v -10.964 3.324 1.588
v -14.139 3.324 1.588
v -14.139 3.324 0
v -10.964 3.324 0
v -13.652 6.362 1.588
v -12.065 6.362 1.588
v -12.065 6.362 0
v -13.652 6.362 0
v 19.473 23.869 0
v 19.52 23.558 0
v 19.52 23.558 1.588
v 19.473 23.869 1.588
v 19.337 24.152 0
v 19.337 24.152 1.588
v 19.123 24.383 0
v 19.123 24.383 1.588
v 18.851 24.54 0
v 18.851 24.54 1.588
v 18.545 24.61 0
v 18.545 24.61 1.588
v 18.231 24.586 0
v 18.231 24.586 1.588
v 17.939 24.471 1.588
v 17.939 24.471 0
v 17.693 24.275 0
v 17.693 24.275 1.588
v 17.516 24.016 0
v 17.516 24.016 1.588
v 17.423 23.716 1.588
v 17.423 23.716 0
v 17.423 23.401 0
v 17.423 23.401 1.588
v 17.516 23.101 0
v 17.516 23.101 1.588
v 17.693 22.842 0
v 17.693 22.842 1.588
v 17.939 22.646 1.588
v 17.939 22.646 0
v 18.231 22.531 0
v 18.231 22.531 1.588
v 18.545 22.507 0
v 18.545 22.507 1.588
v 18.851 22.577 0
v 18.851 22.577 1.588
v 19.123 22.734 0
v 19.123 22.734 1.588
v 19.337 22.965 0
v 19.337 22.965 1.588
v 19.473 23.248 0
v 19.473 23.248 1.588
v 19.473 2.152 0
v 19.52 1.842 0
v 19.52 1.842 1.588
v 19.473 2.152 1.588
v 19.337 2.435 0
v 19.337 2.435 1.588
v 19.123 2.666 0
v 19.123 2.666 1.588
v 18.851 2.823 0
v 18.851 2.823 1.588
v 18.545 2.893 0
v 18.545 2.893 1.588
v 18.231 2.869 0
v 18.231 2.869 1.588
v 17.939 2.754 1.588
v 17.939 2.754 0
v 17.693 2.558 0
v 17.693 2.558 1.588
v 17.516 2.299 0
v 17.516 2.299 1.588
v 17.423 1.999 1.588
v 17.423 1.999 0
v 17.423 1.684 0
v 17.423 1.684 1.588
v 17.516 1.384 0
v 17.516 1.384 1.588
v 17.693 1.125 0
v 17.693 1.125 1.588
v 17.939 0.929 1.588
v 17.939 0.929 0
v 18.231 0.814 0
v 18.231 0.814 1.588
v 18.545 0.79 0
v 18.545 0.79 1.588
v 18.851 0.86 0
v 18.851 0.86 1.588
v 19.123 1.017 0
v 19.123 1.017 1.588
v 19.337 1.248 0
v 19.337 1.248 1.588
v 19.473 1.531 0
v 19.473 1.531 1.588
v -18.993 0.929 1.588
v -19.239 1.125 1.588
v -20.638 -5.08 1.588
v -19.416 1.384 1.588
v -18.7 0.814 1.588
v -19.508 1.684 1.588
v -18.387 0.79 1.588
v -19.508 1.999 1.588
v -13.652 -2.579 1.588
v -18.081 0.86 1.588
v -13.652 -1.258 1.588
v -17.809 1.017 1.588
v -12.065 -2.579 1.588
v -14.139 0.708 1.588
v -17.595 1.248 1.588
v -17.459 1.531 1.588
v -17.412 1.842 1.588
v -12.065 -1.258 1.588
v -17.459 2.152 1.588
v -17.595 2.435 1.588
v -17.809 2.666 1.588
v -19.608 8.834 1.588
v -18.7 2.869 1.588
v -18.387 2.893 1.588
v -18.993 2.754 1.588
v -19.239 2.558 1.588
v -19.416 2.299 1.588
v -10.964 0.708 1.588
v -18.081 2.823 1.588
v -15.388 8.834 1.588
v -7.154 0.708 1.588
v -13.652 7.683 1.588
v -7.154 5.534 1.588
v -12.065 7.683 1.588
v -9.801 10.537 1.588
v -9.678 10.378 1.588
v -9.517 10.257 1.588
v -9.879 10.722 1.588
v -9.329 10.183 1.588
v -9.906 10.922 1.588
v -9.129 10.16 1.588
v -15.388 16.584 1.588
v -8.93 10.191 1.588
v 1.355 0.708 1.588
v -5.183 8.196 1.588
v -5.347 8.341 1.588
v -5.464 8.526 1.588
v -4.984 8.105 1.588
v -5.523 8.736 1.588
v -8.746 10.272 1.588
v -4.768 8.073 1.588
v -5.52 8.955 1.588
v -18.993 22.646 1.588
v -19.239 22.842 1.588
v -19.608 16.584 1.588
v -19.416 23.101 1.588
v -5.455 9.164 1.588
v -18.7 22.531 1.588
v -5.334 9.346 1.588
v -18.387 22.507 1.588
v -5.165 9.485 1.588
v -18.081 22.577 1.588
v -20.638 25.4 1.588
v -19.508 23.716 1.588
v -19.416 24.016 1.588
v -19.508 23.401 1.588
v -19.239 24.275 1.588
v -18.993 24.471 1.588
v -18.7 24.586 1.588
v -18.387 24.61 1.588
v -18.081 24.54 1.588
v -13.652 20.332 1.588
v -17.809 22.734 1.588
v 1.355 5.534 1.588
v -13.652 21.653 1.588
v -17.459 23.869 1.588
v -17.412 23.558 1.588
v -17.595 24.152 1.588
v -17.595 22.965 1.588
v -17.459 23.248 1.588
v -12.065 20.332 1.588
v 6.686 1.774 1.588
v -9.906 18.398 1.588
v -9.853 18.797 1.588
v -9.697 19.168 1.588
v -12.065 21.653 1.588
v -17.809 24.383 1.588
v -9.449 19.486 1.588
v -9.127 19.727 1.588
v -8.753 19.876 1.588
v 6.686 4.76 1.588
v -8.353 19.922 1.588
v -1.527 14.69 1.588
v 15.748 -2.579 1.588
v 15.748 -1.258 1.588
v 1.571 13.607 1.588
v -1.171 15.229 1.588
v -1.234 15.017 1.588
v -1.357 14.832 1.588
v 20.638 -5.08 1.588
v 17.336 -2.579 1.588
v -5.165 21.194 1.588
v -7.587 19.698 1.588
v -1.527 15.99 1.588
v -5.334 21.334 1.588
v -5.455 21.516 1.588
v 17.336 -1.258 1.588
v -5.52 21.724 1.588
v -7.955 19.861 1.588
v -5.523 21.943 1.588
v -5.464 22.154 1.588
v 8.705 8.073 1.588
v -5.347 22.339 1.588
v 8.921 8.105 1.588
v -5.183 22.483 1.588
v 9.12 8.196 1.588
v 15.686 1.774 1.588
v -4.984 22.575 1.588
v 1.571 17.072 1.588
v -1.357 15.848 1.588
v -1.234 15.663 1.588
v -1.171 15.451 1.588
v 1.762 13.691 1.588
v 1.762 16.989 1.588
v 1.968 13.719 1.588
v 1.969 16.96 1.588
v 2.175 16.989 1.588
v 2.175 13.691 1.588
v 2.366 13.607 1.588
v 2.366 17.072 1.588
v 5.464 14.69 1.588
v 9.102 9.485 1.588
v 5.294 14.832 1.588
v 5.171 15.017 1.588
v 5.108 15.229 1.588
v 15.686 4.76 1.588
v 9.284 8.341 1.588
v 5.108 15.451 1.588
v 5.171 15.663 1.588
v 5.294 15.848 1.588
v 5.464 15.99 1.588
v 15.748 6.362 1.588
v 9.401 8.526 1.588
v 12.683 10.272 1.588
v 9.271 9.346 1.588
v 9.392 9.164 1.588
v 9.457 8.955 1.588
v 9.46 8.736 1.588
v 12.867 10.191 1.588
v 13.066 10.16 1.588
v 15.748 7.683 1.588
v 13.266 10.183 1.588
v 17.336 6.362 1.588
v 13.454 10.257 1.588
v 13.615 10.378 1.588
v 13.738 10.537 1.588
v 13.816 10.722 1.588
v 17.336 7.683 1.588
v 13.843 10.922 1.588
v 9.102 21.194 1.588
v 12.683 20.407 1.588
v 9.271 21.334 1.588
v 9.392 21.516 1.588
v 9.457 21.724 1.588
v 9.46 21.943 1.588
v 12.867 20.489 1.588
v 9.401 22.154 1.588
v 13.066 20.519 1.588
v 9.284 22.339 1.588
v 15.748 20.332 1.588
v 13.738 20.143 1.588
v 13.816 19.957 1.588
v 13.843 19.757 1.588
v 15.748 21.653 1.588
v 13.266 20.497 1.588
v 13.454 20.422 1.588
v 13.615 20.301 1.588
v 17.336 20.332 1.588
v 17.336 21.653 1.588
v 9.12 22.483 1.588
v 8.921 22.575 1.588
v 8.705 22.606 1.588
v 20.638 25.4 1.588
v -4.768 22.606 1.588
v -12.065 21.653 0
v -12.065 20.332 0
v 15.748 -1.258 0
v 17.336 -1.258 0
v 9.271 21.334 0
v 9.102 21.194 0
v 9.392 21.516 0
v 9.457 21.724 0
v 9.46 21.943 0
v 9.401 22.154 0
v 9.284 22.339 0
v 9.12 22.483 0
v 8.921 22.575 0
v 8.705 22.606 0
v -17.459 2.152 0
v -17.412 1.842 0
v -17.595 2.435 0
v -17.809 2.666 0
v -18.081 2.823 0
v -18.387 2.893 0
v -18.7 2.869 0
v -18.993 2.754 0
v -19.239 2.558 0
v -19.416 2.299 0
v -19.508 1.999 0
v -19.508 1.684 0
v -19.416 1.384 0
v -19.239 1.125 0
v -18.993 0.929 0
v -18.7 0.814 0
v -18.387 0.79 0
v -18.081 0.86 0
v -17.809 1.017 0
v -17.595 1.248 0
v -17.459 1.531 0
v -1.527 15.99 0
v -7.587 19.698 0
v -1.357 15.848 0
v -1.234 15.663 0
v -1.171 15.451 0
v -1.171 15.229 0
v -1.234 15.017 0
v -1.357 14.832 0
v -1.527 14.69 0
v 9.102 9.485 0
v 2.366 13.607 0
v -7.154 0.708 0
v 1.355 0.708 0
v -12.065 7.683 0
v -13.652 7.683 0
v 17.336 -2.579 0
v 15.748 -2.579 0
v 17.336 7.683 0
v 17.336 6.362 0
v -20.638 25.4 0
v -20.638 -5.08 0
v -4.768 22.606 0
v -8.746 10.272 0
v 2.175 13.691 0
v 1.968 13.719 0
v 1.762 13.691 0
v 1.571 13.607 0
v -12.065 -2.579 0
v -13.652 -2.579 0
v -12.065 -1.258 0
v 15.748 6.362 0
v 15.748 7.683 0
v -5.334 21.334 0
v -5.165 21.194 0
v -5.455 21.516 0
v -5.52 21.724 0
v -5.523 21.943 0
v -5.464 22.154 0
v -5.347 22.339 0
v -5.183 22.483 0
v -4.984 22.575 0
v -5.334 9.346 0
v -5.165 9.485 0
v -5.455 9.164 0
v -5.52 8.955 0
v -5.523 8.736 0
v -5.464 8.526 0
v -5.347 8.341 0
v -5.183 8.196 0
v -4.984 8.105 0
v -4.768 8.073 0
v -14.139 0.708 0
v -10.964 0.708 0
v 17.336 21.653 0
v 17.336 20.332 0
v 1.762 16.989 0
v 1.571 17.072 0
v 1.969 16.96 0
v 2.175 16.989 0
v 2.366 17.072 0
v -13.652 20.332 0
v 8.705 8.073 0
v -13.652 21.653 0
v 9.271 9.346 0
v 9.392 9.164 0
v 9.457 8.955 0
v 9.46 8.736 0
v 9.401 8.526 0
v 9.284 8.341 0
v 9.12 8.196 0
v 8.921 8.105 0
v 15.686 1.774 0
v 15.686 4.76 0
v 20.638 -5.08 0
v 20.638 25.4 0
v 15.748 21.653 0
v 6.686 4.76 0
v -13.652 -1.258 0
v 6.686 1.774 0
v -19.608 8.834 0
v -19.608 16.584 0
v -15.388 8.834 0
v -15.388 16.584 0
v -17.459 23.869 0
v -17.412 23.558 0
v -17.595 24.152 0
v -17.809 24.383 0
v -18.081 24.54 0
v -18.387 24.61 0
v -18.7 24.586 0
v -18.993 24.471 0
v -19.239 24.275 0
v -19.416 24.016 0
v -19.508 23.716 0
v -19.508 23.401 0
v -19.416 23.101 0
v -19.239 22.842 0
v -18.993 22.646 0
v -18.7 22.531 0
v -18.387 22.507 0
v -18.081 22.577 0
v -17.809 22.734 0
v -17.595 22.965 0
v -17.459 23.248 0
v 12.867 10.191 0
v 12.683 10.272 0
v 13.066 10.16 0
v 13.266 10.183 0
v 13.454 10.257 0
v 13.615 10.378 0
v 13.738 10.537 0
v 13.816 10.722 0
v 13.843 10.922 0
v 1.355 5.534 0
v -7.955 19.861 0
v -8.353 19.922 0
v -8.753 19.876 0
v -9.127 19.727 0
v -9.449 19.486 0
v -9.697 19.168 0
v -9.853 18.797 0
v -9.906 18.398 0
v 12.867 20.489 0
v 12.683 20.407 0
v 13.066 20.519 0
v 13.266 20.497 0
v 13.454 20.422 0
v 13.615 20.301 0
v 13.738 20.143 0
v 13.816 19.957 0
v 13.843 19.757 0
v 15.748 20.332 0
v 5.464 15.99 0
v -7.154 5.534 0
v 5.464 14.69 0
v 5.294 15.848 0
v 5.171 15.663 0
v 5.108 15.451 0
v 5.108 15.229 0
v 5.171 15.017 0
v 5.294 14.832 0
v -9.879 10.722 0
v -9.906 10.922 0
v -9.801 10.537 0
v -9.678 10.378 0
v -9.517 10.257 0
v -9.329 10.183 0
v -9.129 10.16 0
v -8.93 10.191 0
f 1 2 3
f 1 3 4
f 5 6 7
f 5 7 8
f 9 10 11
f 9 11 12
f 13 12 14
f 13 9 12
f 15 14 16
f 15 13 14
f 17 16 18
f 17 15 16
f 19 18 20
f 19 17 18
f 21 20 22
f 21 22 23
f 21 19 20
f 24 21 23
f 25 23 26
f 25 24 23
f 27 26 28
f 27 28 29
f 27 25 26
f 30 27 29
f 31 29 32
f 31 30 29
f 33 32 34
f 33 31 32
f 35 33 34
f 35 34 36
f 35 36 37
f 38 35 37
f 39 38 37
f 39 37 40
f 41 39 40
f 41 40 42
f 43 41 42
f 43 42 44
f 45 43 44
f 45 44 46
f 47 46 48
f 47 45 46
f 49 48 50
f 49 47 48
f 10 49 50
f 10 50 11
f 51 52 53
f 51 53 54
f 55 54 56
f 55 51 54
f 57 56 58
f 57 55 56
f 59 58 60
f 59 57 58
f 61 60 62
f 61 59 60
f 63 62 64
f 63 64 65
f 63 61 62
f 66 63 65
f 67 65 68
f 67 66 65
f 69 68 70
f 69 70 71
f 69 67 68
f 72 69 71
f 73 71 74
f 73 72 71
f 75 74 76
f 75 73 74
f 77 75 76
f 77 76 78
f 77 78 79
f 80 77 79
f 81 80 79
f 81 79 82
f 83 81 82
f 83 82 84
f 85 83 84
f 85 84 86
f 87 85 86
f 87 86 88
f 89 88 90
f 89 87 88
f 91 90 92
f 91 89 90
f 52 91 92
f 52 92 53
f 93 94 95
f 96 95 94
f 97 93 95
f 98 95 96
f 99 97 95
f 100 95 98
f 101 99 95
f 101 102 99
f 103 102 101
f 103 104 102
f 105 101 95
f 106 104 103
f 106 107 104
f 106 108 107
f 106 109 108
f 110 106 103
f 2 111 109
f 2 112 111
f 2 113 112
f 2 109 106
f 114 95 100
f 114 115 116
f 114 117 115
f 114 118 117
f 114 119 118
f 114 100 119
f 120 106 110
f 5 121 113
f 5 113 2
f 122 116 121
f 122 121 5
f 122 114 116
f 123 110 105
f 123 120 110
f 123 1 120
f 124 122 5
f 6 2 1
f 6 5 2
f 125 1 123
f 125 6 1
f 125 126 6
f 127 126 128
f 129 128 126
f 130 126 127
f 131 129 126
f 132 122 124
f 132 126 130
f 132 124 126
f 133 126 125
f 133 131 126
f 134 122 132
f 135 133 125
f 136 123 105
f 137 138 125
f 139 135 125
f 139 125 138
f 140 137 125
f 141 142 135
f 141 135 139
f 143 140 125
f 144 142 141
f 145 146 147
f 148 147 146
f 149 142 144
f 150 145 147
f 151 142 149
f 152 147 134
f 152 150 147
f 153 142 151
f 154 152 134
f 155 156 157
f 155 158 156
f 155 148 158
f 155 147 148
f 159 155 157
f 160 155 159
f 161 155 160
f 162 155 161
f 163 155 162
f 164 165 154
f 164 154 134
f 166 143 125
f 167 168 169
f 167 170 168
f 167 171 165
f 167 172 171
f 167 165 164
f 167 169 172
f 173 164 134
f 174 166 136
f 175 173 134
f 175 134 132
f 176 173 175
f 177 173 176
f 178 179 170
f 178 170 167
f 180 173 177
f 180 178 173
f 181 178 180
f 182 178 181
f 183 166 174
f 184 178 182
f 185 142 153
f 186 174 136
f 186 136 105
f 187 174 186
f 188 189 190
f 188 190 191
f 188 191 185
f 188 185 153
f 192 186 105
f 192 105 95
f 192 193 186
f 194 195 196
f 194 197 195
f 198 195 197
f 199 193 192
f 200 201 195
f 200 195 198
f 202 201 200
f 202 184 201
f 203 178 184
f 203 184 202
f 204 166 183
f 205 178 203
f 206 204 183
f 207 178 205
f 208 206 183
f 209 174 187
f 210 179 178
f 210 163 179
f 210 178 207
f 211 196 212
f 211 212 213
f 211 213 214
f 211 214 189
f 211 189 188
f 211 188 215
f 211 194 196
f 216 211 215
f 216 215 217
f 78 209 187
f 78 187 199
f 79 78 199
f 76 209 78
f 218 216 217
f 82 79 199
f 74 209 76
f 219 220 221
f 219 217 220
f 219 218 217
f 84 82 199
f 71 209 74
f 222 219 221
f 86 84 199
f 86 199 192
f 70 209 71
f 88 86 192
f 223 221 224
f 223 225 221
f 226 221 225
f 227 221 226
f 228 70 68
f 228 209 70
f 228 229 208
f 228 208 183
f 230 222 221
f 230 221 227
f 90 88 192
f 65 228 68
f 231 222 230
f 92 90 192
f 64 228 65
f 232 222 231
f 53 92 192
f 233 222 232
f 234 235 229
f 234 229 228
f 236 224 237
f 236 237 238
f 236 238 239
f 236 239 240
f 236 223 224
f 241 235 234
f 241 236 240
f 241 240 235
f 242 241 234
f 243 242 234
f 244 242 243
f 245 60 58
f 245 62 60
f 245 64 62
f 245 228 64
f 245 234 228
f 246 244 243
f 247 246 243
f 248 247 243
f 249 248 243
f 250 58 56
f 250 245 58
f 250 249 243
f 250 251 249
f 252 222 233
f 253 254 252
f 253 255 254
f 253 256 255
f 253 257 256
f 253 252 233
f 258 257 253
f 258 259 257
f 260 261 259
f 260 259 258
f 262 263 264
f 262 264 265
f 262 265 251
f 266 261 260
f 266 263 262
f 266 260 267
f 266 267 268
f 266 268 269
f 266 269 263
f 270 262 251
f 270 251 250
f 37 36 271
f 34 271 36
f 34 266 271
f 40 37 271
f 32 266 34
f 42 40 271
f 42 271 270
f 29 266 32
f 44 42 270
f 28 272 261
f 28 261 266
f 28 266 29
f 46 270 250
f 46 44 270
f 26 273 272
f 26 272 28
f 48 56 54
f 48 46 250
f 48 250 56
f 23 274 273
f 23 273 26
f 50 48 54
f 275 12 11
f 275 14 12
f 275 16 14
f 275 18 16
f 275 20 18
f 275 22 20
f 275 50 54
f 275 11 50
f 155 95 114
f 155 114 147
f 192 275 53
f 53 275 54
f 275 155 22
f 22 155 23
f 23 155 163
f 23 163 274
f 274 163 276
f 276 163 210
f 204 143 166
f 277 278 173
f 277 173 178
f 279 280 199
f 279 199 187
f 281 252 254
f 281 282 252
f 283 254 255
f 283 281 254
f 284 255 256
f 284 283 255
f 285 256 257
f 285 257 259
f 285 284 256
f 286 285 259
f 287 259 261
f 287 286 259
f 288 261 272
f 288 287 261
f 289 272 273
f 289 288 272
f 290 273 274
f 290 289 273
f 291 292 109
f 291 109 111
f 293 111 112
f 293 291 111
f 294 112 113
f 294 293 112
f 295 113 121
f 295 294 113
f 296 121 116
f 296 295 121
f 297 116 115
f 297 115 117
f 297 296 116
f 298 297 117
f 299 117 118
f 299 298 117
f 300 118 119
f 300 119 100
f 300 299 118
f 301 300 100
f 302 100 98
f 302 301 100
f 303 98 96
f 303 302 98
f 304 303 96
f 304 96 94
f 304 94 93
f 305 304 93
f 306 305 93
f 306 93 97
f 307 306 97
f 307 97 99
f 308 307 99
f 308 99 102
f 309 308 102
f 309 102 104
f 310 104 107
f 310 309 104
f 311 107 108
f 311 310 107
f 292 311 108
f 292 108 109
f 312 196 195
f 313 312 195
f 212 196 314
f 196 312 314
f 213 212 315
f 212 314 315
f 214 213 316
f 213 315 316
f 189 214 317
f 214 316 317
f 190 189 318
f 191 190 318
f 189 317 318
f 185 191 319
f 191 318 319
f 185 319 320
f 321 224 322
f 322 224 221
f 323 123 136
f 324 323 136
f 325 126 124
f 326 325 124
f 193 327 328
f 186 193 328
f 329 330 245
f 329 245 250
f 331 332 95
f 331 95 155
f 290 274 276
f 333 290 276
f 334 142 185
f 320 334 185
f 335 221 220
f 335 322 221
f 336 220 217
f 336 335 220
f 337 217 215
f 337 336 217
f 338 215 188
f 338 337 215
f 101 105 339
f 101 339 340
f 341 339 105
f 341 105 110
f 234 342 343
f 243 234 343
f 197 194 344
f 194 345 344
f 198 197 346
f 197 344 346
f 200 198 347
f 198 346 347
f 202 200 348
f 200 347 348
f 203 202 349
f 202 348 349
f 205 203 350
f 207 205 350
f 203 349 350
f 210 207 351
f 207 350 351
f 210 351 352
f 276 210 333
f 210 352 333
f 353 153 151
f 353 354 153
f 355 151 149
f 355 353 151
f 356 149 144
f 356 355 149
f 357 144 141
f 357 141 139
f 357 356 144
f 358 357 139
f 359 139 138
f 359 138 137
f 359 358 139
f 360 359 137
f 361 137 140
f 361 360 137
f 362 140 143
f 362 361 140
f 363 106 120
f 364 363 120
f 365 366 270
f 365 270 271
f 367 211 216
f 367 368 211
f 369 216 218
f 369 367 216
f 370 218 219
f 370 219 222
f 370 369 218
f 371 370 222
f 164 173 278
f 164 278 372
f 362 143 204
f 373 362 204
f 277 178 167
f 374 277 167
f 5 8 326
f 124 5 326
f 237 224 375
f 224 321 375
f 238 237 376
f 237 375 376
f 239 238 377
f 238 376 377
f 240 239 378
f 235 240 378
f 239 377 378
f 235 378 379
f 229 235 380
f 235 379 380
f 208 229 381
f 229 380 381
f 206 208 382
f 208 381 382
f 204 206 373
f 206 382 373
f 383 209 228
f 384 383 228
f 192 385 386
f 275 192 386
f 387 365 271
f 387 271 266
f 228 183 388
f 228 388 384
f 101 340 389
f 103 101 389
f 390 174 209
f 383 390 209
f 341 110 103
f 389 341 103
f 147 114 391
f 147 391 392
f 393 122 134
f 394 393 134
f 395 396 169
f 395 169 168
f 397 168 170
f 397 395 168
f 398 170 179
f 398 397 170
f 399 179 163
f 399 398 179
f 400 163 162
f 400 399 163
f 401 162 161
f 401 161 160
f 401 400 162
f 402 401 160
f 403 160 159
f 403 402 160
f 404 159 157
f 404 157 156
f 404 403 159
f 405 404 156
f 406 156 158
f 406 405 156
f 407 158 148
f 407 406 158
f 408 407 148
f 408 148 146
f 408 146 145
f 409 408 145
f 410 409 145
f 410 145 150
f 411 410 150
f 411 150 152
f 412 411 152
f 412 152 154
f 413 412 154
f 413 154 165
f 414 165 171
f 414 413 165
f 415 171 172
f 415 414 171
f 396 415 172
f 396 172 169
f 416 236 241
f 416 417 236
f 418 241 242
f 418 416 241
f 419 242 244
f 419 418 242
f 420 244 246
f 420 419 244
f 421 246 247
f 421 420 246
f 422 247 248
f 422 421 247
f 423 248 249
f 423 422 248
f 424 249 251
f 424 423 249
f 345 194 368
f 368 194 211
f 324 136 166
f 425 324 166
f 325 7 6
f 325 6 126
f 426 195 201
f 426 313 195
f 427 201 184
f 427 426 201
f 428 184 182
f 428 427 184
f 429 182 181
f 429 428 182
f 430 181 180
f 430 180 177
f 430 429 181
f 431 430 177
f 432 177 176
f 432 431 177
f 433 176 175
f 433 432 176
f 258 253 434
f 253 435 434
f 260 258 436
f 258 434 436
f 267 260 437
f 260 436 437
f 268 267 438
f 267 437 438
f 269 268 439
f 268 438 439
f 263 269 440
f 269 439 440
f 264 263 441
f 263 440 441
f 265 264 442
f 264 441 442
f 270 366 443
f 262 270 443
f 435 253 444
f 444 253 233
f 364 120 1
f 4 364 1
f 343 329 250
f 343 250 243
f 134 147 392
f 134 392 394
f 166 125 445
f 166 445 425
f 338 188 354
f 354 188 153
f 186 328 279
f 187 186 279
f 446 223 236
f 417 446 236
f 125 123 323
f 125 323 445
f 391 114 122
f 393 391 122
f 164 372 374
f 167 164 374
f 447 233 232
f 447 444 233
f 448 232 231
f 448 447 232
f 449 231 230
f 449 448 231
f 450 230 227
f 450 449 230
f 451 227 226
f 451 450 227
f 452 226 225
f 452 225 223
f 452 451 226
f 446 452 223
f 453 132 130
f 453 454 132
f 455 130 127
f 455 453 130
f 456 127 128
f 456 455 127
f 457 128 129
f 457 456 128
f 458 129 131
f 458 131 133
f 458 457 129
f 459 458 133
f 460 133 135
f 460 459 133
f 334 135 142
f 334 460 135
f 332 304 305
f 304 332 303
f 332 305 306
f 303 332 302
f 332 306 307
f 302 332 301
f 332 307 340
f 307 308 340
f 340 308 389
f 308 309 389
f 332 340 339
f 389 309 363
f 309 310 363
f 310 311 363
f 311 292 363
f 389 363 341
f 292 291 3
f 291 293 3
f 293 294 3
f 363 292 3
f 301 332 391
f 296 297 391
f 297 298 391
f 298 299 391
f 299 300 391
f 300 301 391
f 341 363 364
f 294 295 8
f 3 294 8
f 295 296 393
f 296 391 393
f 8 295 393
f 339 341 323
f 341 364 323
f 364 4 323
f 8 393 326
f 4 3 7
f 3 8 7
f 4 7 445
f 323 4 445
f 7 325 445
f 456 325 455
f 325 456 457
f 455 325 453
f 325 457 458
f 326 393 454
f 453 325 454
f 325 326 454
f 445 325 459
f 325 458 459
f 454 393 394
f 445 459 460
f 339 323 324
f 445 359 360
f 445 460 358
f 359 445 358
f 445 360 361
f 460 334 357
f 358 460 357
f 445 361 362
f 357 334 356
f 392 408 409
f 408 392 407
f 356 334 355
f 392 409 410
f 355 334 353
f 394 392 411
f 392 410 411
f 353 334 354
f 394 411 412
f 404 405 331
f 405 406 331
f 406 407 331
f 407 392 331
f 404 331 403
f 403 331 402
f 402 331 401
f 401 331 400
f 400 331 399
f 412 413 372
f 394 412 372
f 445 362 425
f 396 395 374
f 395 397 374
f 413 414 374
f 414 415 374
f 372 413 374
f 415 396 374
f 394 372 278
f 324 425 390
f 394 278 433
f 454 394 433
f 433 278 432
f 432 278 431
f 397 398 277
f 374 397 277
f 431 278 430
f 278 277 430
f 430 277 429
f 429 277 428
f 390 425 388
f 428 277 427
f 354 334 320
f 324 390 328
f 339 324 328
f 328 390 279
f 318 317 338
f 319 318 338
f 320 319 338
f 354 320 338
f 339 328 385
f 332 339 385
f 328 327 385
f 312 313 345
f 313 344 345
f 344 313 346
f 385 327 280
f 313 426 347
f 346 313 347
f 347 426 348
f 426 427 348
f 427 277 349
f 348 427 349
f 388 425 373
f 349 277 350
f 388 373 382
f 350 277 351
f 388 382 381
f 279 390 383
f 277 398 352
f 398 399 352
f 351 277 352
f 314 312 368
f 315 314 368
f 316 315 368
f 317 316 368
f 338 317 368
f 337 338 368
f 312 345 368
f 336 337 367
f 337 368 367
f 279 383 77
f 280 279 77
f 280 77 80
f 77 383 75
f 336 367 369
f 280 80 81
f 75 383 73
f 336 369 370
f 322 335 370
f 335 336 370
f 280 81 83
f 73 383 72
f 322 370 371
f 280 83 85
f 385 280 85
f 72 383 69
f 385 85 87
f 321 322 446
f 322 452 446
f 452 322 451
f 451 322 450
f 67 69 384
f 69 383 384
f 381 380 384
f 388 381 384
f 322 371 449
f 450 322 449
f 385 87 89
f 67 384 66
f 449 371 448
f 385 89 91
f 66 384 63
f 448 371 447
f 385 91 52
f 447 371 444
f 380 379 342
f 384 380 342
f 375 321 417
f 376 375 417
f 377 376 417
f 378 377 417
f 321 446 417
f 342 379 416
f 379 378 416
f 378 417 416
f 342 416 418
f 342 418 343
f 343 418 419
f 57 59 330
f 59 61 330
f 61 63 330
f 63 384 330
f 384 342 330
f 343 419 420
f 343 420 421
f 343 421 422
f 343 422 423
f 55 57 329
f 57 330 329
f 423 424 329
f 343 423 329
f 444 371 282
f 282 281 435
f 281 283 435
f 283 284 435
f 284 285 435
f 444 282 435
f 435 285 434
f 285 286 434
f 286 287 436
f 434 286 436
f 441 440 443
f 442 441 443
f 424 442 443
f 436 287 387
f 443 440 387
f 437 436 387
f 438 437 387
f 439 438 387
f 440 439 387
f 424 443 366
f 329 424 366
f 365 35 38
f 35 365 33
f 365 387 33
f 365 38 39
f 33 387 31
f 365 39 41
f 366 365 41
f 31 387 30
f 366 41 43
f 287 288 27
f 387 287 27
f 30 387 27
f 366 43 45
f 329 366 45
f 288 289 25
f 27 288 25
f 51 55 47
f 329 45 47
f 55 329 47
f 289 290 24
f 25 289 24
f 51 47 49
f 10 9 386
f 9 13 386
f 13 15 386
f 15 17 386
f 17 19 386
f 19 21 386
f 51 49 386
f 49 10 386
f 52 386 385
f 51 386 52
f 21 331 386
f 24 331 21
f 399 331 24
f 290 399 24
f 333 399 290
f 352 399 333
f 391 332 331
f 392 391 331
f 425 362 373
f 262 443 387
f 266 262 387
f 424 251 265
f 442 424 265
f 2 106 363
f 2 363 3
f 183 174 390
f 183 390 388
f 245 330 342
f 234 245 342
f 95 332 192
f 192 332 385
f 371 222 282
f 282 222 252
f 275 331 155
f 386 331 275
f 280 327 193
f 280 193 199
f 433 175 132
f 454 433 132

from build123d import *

# Parameters (mm, degrees)
SKETCH1_W              = 41.275
SKETCH1_H              = 25.4
SKETCH1_R              = 1.0541
SKETCH1_H_2            = 5.08
BOSS_EXTRUDE1_DEPTH    = 1.5875
ATTACHMENT_HOLES_REACH = 34.766
SKETCH3_W              = 1.5875
SKETCH3_H              = 1.3208
SKETCH2_W              = 8.509
SKETCH2_H              = 4.826
SKETCH2_W_2            = 4.22
SKETCH2_H_2            = 7.75
SKETCH2_W_3            = 3.175
SKETCH2_H_3            = 2.6162
SKETCH2_W_4            = 9
SKETCH2_H_4            = 2.985879982
CUT_EXTRUDE1_DEPTH     = 1.5875
FILLET8_R              = 0.762
FILLET9_R              = 1.524


with BuildPart() as part:
    # Sketch1 → Boss-Extrude1 (new body)
    # profile 1 of 2: a face of its own
    with BuildSketch(Plane.XY):
        with Locations((0, 12.7)):
            Rectangle(SKETCH1_W, SKETCH1_H)
        with Locations((-18.4658, 1.8415)):
            Circle(SKETCH1_R, mode=Mode.SUBTRACT)
        with Locations((18.4658, 1.8415)):
            Circle(SKETCH1_R, mode=Mode.SUBTRACT)
        with Locations((-18.4658, 23.5585)):
            Circle(SKETCH1_R, mode=Mode.SUBTRACT)
        with Locations((18.4658, 23.5585)):
            Circle(SKETCH1_R, mode=Mode.SUBTRACT)
    # profile 2 of 2: a face of its own
    with BuildSketch(Plane.XY):
        with Locations((0, -2.54)):
            Rectangle(SKETCH1_W, SKETCH1_H_2)
    extrude(amount=BOSS_EXTRUDE1_DEPTH)

    # Sketch3 → Attachment Holes (cut, up to next)
    with BuildSketch(Plane(origin=(0, 0, 0), x_dir=(-1, 0, 0), z_dir=(0, 0, -1)), mode=Mode.PRIVATE) as attachment_holes_sk1:
        with Locations((-16.54175, 20.992155968)):
            Rectangle(SKETCH3_W, SKETCH3_H)
    attachment_holes_tool1 = extrude(attachment_holes_sk1.sketch, amount=-ATTACHMENT_HOLES_REACH, mode=Mode.PRIVATE) & part.part
    # Sketch3 → Attachment Holes (cut, up to next)
    with BuildSketch(Plane(origin=(0, 0, 0), x_dir=(-1, 0, 0), z_dir=(0, 0, -1)), mode=Mode.PRIVATE) as attachment_holes_sk2:
        with Locations((-16.54175, 7.022155968)):
            Rectangle(SKETCH3_W, SKETCH3_H)
    attachment_holes_tool2 = extrude(attachment_holes_sk2.sketch, amount=-ATTACHMENT_HOLES_REACH, mode=Mode.PRIVATE) & part.part
    # Sketch3 → Attachment Holes (cut, up to next)
    with BuildSketch(Plane(origin=(0, 0, 0), x_dir=(-1, 0, 0), z_dir=(0, 0, -1)), mode=Mode.PRIVATE) as attachment_holes_sk3:
        with Locations((-16.54175, -1.918644032)):
            Rectangle(SKETCH3_W, SKETCH3_H)
    attachment_holes_tool3 = extrude(attachment_holes_sk3.sketch, amount=-ATTACHMENT_HOLES_REACH, mode=Mode.PRIVATE) & part.part
    # Sketch3 → Attachment Holes (cut, up to next)
    with BuildSketch(Plane(origin=(0, 0, 0), x_dir=(-1, 0, 0), z_dir=(0, 0, -1)), mode=Mode.PRIVATE) as attachment_holes_sk4:
        with Locations((12.85875, 20.992155968)):
            Rectangle(SKETCH3_W, SKETCH3_H)
    attachment_holes_tool4 = extrude(attachment_holes_sk4.sketch, amount=-ATTACHMENT_HOLES_REACH, mode=Mode.PRIVATE) & part.part
    # Sketch3 → Attachment Holes (cut, up to next)
    with BuildSketch(Plane(origin=(0, 0, 0), x_dir=(-1, 0, 0), z_dir=(0, 0, -1)), mode=Mode.PRIVATE) as attachment_holes_sk5:
        with Locations((12.85875, 7.022155968)):
            Rectangle(SKETCH3_W, SKETCH3_H)
    attachment_holes_tool5 = extrude(attachment_holes_sk5.sketch, amount=-ATTACHMENT_HOLES_REACH, mode=Mode.PRIVATE) & part.part
    # Sketch3 → Attachment Holes (cut, up to next)
    with BuildSketch(Plane(origin=(0, 0, 0), x_dir=(-1, 0, 0), z_dir=(0, 0, -1)), mode=Mode.PRIVATE) as attachment_holes_sk6:
        with Locations((12.85875, -1.918644032)):
            Rectangle(SKETCH3_W, SKETCH3_H)
    attachment_holes_tool6 = extrude(attachment_holes_sk6.sketch, amount=-ATTACHMENT_HOLES_REACH, mode=Mode.PRIVATE) & part.part
    add(attachment_holes_tool1.solids().sort_by_distance((16.54175, 20.992156, 0))[0], mode=Mode.SUBTRACT)
    add(attachment_holes_tool2.solids().sort_by_distance((16.54175, 7.022156, 0))[0], mode=Mode.SUBTRACT)
    add(attachment_holes_tool3.solids().sort_by_distance((16.54175, -1.918644, 0))[0], mode=Mode.SUBTRACT)
    add(attachment_holes_tool4.solids().sort_by_distance((-12.85875, 20.992156, 0))[0], mode=Mode.SUBTRACT)
    add(attachment_holes_tool5.solids().sort_by_distance((-12.85875, 7.022156, 0))[0], mode=Mode.SUBTRACT)
    add(attachment_holes_tool6.solids().sort_by_distance((-12.85875, -1.918644, 0))[0], mode=Mode.SUBTRACT)

    # Sketch2 → Cut-Extrude1 (cut)
    with BuildSketch(Plane.XY.offset(1.5875)):
        Polygon((11.409828794, 8.0735), (1.9685, 13.850842654), (-7.472828794, 8.0735), align=None)
        Polygon((13.843, 21.117092654), (4.401671206, 15.33975), (13.843, 9.562407346), align=None)
        Polygon((-7.472828794, 22.606), (1.9685, 16.828657346), (11.409828794, 22.606), align=None)
        Polygon((-0.464671206, 15.33975), (-9.906, 21.117092654), (-9.906, 9.562407346), align=None)
        with Locations((-2.8993, 3.1205)):
            Rectangle(SKETCH2_W, SKETCH2_H)
        with Locations((-17.4978, 12.709)):
            Rectangle(SKETCH2_W_2, SKETCH2_H_2)
        with Locations((-12.5513, 2.0156)):
            Rectangle(SKETCH2_W_3, SKETCH2_H_3)
        with Locations((11.1858, 3.267239991)):
            Rectangle(SKETCH2_W_4, SKETCH2_H_4)
    extrude(amount=-CUT_EXTRUDE1_DEPTH, mode=Mode.SUBTRACT)

    # Fillet8
    fillet8_edges = [part.edges().sort_by_distance(p)[0] for p in [
        (-7.472828794, 8.0735, 0.79375),
        (1.9685, 13.850842654, 0.79375),
        (11.409828794, 8.0735, 0.79375),
        (4.401671206, 15.33975, 0.79375),
        (13.843, 21.117092654, 0.79375),
        (13.843, 9.562407346, 0.79375),
        (1.9685, 16.828657346, 0.79375),
        (-7.472828794, 22.606, 0.79375),
        (11.409828794, 22.606, 0.79375),
        (-9.906, 9.562407346, 0.79375),
        (-0.464671206, 15.33975, 0.79375),
    ]]
    fillet(fillet8_edges, radius=FILLET8_R)

    # Fillet9
    fillet9_edges = [part.edges().sort_by_distance(p)[0] for p in [
        (-9.906, 21.117092654, 0.79375),
    ]]
    fillet(fillet9_edges, radius=FILLET9_R)


solid = part.part
